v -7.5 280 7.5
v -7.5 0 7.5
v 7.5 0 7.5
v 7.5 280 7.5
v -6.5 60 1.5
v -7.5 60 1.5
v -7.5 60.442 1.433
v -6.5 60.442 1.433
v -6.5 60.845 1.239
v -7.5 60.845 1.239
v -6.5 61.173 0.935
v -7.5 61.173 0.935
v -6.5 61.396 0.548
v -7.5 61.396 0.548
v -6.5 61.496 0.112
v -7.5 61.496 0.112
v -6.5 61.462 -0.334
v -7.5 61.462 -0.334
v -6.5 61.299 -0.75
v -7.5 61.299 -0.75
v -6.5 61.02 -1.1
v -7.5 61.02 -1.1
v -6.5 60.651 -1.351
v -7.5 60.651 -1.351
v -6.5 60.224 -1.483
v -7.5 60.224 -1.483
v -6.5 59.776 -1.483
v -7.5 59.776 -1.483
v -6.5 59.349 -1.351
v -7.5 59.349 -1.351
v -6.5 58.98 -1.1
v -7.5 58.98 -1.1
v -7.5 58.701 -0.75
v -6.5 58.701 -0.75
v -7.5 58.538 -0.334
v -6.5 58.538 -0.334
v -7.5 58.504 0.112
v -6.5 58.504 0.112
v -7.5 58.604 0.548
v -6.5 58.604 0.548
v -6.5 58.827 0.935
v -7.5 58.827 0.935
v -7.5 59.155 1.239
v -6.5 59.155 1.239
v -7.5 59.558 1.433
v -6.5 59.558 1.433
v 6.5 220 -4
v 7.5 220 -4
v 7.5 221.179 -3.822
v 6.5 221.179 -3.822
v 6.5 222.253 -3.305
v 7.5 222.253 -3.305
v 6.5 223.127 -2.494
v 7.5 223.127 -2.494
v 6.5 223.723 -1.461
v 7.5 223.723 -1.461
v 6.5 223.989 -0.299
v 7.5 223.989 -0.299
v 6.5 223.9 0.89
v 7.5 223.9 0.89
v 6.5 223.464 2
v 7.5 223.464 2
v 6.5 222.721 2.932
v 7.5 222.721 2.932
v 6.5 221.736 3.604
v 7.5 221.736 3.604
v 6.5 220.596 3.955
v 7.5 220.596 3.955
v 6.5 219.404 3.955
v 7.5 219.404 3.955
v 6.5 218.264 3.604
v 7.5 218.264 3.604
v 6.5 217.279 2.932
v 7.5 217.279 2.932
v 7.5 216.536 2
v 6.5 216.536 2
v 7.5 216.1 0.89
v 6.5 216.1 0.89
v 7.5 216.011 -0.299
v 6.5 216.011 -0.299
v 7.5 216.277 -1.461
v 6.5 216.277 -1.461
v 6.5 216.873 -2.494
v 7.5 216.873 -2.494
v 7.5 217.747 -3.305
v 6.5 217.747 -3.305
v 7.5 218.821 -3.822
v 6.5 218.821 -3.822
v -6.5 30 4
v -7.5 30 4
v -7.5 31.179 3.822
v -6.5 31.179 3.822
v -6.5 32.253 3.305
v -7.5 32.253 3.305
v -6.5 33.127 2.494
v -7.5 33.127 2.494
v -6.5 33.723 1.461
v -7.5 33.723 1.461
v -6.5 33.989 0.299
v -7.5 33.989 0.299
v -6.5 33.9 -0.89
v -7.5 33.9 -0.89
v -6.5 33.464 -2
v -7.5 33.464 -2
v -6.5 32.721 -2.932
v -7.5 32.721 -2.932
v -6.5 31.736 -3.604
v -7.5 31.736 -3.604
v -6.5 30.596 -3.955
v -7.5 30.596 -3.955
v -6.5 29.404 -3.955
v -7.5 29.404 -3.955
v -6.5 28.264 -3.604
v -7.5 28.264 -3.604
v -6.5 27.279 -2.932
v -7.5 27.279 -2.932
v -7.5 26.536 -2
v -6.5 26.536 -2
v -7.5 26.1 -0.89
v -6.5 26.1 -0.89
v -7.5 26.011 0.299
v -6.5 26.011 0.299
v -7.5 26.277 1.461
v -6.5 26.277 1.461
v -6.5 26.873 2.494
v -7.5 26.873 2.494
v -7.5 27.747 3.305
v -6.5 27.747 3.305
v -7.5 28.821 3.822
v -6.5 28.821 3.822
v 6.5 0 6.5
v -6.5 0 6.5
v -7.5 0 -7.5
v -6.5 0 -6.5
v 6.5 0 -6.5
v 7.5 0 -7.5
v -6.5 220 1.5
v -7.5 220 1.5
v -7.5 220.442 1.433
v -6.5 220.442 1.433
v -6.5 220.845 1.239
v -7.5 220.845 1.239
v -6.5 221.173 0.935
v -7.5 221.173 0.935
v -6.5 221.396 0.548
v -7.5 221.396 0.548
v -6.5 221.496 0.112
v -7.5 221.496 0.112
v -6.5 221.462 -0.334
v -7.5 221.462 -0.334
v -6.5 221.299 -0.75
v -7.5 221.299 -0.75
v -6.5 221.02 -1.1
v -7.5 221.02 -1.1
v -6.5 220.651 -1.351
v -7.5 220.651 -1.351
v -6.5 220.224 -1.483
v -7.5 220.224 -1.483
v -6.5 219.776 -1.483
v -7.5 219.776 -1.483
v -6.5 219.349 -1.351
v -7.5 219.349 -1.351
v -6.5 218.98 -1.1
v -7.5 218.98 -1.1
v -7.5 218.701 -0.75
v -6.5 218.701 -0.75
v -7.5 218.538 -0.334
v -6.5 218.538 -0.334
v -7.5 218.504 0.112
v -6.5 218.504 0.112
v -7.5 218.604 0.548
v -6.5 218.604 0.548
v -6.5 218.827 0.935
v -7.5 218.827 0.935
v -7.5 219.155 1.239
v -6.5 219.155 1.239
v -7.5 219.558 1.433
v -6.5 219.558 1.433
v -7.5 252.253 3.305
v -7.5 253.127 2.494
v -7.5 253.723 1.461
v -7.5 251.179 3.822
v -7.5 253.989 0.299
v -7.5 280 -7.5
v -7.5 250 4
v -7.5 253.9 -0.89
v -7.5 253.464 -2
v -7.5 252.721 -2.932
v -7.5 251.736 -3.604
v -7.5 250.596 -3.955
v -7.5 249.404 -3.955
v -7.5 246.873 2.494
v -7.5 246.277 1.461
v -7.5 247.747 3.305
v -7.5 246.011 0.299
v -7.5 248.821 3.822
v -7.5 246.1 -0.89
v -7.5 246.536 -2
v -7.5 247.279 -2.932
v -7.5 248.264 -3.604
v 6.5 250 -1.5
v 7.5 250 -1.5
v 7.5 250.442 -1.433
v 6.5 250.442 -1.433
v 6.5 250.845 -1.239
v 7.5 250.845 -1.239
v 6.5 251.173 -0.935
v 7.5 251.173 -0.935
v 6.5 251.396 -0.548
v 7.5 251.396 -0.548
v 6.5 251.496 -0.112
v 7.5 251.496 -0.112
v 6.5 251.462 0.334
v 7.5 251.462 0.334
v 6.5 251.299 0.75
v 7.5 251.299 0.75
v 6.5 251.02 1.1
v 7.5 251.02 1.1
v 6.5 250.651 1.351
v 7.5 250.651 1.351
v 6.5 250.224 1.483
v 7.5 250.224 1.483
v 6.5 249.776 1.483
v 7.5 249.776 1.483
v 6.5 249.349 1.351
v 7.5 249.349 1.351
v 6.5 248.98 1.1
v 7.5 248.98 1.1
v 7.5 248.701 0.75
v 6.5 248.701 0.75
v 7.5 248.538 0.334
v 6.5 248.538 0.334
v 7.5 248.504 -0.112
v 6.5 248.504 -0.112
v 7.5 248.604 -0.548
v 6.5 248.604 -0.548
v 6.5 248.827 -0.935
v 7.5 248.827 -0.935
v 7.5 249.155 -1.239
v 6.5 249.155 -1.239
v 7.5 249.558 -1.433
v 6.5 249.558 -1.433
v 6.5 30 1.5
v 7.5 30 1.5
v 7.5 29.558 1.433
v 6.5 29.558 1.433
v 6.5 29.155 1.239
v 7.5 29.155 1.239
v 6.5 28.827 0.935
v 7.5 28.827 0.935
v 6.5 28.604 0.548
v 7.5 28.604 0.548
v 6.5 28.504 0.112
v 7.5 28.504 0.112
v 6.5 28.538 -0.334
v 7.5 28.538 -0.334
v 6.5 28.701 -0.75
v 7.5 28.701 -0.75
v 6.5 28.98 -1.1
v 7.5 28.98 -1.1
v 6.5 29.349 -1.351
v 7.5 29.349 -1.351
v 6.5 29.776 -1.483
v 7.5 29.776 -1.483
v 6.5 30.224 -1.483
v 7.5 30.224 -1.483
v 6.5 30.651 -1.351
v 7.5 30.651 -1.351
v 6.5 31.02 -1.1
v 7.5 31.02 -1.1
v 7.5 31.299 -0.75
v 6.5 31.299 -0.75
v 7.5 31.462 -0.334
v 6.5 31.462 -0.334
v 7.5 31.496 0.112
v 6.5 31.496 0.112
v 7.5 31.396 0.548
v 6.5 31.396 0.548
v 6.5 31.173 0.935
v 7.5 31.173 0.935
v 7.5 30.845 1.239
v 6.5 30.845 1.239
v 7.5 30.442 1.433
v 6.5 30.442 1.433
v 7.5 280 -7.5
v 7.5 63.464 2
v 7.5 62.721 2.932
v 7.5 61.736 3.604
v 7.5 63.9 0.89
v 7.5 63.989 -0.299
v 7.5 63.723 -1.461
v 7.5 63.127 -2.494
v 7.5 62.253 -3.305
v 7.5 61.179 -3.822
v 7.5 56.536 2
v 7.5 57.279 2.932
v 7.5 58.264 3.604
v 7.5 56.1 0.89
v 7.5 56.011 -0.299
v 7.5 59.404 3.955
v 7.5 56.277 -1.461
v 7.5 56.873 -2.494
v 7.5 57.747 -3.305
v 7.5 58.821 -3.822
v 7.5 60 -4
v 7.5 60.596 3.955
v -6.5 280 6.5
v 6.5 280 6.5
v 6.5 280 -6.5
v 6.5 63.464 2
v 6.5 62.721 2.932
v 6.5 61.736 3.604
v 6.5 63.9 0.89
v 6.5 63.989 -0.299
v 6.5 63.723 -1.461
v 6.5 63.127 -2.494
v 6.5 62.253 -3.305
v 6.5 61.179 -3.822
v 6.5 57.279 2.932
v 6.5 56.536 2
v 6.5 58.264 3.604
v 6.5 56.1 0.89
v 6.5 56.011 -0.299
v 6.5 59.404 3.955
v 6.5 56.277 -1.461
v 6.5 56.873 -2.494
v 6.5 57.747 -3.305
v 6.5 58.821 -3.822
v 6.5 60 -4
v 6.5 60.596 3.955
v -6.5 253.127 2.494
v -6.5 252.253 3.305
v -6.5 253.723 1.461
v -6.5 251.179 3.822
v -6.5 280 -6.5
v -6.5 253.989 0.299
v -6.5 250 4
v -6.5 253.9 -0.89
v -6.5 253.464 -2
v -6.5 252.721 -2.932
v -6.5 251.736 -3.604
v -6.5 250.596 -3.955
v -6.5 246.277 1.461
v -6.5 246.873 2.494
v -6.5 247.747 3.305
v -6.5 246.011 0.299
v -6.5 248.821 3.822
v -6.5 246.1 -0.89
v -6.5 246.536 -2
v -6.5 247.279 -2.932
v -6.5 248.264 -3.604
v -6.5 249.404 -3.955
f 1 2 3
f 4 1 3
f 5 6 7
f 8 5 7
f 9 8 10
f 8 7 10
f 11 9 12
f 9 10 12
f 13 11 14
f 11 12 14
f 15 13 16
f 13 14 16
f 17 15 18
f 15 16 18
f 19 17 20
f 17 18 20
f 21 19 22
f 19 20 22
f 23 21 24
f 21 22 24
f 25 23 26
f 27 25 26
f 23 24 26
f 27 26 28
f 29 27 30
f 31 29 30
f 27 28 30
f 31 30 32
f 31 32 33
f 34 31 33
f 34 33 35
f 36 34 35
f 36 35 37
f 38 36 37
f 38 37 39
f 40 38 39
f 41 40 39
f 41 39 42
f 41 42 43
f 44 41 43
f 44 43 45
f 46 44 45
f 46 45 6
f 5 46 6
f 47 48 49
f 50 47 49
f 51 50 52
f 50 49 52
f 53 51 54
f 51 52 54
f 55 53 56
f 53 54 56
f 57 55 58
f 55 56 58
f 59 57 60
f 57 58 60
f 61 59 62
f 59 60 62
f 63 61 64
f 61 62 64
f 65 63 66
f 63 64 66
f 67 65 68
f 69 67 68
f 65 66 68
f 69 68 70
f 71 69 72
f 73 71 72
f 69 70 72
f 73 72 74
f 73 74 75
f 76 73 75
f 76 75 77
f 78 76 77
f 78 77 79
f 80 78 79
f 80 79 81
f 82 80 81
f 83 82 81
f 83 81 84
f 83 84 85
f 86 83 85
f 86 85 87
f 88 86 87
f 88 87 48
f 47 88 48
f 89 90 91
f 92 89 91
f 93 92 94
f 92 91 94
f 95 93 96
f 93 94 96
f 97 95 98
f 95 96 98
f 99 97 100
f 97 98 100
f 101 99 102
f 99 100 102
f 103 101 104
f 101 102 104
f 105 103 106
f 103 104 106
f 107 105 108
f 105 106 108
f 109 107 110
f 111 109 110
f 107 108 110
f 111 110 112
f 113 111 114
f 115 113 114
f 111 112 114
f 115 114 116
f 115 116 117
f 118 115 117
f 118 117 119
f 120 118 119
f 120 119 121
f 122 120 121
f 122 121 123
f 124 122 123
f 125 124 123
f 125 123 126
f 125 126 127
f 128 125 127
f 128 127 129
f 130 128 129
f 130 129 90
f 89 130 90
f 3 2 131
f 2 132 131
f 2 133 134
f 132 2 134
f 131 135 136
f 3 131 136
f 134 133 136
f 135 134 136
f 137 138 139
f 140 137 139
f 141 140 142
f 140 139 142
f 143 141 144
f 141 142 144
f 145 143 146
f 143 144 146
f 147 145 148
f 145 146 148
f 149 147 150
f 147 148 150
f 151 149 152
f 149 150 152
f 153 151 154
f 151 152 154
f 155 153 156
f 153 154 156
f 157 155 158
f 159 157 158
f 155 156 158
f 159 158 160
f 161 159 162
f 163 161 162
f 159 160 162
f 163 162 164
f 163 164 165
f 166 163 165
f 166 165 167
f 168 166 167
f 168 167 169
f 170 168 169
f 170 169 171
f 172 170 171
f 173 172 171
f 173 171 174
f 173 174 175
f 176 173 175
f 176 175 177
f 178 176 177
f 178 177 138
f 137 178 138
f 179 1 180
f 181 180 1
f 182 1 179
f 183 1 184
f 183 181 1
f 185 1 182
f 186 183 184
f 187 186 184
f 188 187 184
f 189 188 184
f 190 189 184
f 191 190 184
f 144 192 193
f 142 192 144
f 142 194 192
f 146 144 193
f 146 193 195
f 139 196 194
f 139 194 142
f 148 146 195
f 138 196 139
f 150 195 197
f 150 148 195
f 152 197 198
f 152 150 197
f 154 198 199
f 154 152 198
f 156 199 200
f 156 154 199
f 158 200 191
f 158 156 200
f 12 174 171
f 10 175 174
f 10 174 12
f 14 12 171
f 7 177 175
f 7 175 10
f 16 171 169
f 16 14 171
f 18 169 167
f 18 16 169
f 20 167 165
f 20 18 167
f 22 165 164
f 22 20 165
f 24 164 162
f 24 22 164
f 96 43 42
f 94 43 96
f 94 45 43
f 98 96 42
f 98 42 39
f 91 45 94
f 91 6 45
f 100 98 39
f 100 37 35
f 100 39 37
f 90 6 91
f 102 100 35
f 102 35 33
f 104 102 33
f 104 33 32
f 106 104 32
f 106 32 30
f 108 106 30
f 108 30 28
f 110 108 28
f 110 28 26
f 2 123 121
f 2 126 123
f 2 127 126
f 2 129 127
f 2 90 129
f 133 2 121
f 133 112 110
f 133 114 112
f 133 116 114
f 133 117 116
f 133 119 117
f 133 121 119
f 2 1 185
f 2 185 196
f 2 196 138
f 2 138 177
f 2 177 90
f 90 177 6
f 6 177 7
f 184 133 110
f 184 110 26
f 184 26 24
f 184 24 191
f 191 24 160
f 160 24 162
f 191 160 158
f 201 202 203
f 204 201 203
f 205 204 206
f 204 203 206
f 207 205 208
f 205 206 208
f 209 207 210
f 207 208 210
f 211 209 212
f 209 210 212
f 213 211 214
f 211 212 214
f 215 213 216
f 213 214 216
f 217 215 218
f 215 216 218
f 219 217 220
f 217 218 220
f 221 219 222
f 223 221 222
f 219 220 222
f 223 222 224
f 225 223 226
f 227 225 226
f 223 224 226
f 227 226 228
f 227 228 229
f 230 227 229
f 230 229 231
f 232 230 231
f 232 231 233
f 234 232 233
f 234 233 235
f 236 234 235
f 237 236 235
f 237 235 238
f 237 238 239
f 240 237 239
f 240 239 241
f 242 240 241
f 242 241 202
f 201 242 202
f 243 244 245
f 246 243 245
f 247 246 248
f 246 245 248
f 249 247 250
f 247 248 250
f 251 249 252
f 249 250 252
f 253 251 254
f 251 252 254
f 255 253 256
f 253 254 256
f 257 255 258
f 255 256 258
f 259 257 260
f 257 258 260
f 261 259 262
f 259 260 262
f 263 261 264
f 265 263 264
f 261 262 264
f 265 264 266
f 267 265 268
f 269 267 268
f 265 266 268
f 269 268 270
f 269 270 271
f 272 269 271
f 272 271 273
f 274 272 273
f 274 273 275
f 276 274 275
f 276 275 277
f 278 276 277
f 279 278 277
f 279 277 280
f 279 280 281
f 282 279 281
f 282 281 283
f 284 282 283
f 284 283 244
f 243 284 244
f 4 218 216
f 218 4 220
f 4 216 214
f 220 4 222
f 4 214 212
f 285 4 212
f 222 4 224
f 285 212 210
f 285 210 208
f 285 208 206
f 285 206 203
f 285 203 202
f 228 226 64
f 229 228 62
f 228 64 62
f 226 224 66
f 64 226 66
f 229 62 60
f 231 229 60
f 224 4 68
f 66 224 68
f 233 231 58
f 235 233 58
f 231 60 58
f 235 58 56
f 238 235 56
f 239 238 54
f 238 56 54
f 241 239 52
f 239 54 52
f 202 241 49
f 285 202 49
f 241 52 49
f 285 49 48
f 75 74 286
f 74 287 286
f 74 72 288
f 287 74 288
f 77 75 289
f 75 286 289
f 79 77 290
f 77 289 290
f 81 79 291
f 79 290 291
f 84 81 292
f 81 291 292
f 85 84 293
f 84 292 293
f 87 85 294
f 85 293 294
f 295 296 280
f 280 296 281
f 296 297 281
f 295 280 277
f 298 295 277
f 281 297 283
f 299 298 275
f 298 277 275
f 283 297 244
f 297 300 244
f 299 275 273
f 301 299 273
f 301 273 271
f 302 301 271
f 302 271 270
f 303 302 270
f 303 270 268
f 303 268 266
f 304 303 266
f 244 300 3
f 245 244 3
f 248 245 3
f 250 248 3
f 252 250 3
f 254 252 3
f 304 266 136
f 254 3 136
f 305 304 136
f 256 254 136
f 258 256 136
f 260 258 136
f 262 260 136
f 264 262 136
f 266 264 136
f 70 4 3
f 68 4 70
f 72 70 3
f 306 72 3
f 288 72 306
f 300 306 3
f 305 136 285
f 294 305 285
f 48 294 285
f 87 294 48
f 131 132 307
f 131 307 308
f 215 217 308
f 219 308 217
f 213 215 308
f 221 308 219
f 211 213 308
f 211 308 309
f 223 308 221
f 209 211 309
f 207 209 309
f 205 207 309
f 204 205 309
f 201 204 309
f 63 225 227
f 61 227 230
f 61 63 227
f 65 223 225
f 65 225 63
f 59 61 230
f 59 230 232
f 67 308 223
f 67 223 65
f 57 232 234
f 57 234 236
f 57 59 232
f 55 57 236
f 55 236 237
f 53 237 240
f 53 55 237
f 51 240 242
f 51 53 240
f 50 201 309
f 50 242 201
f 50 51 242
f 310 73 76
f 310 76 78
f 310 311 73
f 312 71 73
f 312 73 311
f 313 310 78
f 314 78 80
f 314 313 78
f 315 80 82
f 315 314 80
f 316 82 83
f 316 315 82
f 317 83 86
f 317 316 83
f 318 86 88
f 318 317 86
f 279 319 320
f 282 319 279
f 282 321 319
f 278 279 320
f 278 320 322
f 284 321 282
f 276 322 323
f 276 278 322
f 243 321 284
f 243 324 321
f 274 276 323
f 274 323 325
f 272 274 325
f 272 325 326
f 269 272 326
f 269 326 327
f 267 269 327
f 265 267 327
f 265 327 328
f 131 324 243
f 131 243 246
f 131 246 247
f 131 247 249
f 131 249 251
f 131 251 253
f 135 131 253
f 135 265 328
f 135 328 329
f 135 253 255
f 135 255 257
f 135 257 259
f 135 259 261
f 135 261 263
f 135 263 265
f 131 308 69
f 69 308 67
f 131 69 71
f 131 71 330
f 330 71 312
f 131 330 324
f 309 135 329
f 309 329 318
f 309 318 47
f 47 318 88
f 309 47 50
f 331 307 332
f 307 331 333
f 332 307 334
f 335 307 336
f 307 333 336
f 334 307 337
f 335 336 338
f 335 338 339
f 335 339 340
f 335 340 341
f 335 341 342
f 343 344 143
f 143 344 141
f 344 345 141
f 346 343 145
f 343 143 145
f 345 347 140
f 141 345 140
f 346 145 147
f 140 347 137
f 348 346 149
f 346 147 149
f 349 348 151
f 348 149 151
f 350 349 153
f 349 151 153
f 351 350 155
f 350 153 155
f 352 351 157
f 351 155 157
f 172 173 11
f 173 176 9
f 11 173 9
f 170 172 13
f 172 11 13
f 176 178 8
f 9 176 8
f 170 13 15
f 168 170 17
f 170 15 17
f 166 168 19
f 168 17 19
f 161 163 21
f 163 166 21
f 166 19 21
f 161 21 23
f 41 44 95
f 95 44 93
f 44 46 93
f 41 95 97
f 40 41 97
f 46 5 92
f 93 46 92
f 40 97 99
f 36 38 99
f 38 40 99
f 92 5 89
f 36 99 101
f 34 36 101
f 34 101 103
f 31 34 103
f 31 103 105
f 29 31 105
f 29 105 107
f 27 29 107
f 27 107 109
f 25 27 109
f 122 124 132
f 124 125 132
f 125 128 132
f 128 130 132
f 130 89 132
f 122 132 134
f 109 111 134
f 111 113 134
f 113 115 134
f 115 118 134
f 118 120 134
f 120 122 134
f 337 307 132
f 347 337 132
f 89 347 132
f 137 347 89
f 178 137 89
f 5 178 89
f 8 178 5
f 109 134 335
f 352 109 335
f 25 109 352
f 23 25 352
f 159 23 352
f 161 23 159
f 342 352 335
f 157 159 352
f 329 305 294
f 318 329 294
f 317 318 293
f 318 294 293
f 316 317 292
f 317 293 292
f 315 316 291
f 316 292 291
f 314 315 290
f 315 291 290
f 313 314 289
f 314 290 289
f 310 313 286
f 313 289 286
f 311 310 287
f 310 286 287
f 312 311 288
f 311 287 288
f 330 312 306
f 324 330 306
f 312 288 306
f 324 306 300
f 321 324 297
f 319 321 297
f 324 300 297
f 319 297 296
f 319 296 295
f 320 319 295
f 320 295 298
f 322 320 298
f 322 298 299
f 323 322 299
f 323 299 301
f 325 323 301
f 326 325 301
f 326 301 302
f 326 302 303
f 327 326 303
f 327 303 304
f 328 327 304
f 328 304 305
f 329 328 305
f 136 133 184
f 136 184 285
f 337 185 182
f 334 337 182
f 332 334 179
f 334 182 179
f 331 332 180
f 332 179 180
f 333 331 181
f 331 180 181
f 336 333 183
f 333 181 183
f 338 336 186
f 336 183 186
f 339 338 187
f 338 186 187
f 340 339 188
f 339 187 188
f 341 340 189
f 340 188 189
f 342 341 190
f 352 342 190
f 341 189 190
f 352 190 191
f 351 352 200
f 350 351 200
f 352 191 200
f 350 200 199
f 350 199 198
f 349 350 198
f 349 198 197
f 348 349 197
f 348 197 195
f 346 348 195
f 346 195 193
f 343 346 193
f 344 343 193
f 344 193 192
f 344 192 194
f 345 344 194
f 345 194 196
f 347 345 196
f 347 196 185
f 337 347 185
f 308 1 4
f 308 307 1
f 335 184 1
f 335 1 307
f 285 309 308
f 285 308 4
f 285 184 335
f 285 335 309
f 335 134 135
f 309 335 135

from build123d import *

# Parameters (mm, degrees)
SKETCH_1_W          = 15
SKETCH_1_H          = 15
SKETCH_1_W_2        = 13
SKETCH_1_H_2        = 13
EXTRUDE_1_DEPTH     = 280
SKETCH_2_R          = 1.5
CUT_EXTRUDE_1_DEPTH = 260
SKETCH_3_R          = 4
CUT_EXTRUDE_2_DEPTH = 2
SKETCH_4_R          = 1.5
CUT_EXTRUDE_3_DEPTH = 281.501782526
SKETCH_5_R          = 4
CUT_EXTRUDE_4_DEPTH = 2


with BuildPart() as part:
    # 草图1 → 凸台-拉伸1 (new body)
    with BuildSketch(Plane(origin=(0, 0, 0), x_dir=(1, 0, 0), z_dir=(0, 1, 0))):
        Rectangle(SKETCH_1_W, SKETCH_1_H)
        Rectangle(SKETCH_1_W_2, SKETCH_1_H_2, mode=Mode.SUBTRACT)
    extrude(amount=EXTRUDE_1_DEPTH)

    # 草图2 → 切除-拉伸1 (cut)
    with BuildSketch(Plane.ZY.offset(7.5)):
        with Locations((0, 220)):
            Circle(SKETCH_2_R)
        with Locations((0, 60)):
            Circle(SKETCH_2_R)
    extrude(amount=-CUT_EXTRUDE_1_DEPTH, mode=Mode.SUBTRACT)

    # 草图3 → 切除-拉伸2 (cut)
    with BuildSketch(Plane(origin=(7.5, 0, 0), x_dir=(0, 0, -1), z_dir=(1, 0, 0))):
        with Locations((0, 60)):
            Circle(SKETCH_3_R)
        with Locations((0, 220)):
            Circle(SKETCH_3_R)
    extrude(amount=-CUT_EXTRUDE_2_DEPTH, mode=Mode.SUBTRACT)

    # 草图4 → 切除-拉伸3 (cut, through all)
    with BuildSketch(Plane(origin=(7.5, 0, 0), x_dir=(0, 0, -1), z_dir=(1, 0, 0))):
        with Locations((0, 250)):
            Circle(SKETCH_4_R)
        with Locations(Location((0, 30, 0), (0, 0, 180))):
            Circle(SKETCH_4_R)
    extrude(amount=-CUT_EXTRUDE_3_DEPTH, mode=Mode.SUBTRACT)

    # 草图5 → 切除-拉伸4 (cut)
    with BuildSketch(Plane.ZY.offset(7.5)):
        with Locations((0, 250)):
            Circle(SKETCH_5_R)
        with Locations((0, 30)):
            Circle(SKETCH_5_R)
    extrude(amount=-CUT_EXTRUDE_4_DEPTH, mode=Mode.SUBTRACT)


solid = part.part
